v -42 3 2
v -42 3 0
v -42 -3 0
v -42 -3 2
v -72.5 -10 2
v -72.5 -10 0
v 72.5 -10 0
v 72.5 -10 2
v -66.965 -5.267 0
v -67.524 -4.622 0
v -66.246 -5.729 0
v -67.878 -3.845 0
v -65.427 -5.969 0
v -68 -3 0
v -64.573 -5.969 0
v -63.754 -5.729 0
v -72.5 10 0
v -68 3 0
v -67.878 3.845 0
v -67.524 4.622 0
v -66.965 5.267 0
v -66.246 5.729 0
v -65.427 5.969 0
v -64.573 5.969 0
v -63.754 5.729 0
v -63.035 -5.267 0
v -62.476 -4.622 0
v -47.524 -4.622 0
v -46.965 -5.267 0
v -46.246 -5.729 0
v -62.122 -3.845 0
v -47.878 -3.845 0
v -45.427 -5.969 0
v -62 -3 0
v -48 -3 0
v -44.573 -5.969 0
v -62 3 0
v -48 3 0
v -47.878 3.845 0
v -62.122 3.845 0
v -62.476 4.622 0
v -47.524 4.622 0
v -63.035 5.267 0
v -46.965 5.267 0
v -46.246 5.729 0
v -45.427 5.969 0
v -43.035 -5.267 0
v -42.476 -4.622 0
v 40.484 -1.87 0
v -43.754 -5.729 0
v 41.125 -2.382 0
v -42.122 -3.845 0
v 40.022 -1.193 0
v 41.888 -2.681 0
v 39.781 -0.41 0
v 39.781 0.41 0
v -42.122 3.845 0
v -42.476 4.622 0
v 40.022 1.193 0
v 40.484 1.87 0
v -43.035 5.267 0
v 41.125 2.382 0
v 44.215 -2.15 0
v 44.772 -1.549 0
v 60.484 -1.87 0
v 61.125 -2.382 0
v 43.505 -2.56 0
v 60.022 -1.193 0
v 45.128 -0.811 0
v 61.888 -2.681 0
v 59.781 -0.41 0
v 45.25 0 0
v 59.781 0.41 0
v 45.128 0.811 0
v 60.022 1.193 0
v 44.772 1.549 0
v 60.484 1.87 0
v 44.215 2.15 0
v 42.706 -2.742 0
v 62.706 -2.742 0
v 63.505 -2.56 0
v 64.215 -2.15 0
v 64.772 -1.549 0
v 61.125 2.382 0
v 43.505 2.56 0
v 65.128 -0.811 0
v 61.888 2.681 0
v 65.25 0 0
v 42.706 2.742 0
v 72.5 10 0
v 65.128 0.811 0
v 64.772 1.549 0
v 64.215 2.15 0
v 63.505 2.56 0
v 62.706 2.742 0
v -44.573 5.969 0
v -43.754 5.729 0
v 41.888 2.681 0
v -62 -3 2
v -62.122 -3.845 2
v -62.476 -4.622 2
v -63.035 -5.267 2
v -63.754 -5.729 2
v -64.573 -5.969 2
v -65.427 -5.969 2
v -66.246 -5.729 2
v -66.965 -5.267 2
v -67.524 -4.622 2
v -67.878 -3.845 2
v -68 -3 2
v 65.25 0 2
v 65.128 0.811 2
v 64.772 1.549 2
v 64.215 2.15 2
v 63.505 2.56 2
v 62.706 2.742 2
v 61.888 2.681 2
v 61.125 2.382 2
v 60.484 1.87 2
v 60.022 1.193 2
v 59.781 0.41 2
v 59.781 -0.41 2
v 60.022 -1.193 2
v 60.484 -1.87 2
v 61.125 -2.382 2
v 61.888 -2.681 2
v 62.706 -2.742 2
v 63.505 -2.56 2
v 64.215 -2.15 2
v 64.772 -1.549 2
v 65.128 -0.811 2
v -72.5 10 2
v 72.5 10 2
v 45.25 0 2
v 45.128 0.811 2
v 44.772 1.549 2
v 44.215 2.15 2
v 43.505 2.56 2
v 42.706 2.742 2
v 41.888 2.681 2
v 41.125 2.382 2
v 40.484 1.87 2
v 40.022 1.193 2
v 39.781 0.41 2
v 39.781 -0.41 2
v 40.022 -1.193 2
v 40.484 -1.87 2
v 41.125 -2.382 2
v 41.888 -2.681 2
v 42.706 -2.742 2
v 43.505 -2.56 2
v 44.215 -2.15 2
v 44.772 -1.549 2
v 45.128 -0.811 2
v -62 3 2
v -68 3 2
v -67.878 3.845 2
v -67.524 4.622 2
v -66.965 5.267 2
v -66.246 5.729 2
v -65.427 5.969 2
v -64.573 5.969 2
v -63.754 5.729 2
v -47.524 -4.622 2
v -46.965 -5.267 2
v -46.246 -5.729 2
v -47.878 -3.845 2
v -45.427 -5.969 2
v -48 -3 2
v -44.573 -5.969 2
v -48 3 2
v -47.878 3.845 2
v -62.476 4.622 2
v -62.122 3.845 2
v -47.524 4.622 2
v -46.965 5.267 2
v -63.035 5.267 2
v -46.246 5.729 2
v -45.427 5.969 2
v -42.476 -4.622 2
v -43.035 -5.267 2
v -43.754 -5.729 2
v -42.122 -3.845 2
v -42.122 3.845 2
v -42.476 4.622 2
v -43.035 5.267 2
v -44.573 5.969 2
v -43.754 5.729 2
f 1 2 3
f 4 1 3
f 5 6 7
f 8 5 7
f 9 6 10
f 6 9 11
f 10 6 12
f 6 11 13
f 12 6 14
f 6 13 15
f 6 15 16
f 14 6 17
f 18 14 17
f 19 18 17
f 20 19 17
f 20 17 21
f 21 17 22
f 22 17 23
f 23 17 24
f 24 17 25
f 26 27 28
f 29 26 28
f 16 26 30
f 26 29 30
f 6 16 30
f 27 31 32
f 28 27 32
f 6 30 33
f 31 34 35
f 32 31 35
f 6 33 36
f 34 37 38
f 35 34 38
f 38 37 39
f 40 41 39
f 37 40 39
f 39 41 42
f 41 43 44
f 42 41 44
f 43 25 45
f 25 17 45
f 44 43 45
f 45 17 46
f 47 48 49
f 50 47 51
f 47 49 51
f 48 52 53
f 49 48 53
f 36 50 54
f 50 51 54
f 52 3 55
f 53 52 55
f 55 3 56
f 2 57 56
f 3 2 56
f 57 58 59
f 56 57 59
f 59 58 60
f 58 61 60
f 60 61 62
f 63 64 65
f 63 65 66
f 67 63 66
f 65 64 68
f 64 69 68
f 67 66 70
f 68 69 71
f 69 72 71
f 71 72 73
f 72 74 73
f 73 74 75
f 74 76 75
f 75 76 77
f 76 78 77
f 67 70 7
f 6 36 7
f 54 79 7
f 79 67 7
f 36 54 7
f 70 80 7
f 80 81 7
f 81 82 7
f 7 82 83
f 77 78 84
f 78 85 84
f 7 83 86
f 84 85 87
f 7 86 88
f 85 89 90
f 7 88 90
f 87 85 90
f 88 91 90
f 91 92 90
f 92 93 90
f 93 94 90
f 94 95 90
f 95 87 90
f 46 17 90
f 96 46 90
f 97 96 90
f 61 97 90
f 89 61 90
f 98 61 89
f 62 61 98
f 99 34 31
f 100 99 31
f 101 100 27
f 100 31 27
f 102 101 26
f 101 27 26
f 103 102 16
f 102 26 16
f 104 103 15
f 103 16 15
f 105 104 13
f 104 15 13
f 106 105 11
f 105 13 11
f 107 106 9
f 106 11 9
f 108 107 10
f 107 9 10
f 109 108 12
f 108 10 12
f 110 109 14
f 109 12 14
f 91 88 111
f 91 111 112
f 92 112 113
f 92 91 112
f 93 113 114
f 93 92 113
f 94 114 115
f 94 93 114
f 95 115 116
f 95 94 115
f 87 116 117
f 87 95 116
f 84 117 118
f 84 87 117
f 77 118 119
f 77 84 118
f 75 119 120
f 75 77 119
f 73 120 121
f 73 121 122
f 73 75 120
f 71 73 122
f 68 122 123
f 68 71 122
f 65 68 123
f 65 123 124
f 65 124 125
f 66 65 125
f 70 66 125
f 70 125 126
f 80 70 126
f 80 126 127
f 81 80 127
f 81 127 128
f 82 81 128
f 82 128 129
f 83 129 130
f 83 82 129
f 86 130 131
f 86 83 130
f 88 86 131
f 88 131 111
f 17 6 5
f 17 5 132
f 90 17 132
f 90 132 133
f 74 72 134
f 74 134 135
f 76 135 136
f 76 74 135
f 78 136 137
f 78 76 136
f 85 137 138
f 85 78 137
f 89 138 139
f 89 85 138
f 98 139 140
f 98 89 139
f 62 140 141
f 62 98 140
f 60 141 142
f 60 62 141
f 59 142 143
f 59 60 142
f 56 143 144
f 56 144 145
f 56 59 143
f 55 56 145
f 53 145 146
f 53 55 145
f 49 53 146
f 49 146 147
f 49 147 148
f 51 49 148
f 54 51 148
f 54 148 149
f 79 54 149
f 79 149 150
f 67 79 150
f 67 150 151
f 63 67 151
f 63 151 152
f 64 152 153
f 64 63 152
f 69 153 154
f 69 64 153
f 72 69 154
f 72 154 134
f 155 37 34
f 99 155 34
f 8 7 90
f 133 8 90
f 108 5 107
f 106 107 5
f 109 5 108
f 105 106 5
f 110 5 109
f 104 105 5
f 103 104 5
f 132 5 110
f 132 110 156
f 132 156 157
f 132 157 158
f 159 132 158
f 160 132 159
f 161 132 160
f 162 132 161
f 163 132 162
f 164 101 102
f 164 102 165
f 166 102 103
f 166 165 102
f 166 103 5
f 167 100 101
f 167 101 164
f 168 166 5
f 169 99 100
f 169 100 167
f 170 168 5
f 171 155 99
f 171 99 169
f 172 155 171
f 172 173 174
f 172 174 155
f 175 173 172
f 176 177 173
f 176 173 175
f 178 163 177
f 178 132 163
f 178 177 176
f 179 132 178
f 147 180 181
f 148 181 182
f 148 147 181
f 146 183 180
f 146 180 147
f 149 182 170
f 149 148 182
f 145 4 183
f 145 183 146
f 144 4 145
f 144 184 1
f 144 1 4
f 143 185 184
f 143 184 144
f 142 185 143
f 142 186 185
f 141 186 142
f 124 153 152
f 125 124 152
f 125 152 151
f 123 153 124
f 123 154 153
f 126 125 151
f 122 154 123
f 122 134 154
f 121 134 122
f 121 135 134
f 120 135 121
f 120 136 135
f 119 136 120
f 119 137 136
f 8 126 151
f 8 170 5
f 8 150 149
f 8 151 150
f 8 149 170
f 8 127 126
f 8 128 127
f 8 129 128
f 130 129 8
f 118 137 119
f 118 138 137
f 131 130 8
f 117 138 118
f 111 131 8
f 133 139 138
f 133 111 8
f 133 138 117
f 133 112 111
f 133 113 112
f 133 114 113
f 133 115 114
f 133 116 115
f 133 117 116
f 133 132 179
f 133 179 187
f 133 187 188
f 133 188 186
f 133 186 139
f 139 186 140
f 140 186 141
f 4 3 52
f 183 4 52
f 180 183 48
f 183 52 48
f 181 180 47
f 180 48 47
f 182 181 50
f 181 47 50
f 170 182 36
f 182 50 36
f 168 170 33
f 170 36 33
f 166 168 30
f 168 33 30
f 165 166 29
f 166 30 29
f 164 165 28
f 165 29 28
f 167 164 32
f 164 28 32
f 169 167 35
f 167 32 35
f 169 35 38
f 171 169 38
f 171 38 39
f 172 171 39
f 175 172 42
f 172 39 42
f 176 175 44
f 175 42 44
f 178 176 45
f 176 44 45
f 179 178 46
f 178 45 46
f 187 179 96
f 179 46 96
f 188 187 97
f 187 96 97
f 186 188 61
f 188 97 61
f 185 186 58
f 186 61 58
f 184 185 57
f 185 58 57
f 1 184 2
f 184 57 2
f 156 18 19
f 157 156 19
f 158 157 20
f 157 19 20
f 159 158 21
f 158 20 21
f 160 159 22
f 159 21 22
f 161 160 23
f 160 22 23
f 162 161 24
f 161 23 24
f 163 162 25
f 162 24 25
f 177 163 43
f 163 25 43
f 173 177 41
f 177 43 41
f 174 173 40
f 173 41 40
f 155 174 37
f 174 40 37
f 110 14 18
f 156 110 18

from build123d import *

# Parameters (mm, degrees)
SKETCH1_W           = 145
SKETCH1_H           = 20
SKETCH1_R           = 2.75
BOSS_EXTRUDE1_DEPTH = 2


with BuildPart() as part:
    # Sketch1 → Boss-Extrude1 (new body)
    with BuildSketch(Plane.XY):
        Rectangle(SKETCH1_W, SKETCH1_H)
        with Locations((62.5, 0)):
            Circle(SKETCH1_R, mode=Mode.SUBTRACT)
        with Locations((42.5, 0)):
            Circle(SKETCH1_R, mode=Mode.SUBTRACT)
        with BuildLine():
            Line((-68, -3), (-68, 3))
            ThreePointArc((-68, 3), (-65, 6), (-62, 3))
            Line((-62, 3), (-62, -3))
            ThreePointArc((-62, -3), (-65, -6), (-68, -3))
        make_face(mode=Mode.SUBTRACT)
        with BuildLine():
            Line((-48, -3), (-48, 3))
            ThreePointArc((-48, 3), (-45, 6), (-42, 3))
            Line((-42, 3), (-42, -3))
            ThreePointArc((-42, -3), (-45, -6), (-48, -3))
        make_face(mode=Mode.SUBTRACT)
    extrude(amount=BOSS_EXTRUDE1_DEPTH)


solid = part.part
